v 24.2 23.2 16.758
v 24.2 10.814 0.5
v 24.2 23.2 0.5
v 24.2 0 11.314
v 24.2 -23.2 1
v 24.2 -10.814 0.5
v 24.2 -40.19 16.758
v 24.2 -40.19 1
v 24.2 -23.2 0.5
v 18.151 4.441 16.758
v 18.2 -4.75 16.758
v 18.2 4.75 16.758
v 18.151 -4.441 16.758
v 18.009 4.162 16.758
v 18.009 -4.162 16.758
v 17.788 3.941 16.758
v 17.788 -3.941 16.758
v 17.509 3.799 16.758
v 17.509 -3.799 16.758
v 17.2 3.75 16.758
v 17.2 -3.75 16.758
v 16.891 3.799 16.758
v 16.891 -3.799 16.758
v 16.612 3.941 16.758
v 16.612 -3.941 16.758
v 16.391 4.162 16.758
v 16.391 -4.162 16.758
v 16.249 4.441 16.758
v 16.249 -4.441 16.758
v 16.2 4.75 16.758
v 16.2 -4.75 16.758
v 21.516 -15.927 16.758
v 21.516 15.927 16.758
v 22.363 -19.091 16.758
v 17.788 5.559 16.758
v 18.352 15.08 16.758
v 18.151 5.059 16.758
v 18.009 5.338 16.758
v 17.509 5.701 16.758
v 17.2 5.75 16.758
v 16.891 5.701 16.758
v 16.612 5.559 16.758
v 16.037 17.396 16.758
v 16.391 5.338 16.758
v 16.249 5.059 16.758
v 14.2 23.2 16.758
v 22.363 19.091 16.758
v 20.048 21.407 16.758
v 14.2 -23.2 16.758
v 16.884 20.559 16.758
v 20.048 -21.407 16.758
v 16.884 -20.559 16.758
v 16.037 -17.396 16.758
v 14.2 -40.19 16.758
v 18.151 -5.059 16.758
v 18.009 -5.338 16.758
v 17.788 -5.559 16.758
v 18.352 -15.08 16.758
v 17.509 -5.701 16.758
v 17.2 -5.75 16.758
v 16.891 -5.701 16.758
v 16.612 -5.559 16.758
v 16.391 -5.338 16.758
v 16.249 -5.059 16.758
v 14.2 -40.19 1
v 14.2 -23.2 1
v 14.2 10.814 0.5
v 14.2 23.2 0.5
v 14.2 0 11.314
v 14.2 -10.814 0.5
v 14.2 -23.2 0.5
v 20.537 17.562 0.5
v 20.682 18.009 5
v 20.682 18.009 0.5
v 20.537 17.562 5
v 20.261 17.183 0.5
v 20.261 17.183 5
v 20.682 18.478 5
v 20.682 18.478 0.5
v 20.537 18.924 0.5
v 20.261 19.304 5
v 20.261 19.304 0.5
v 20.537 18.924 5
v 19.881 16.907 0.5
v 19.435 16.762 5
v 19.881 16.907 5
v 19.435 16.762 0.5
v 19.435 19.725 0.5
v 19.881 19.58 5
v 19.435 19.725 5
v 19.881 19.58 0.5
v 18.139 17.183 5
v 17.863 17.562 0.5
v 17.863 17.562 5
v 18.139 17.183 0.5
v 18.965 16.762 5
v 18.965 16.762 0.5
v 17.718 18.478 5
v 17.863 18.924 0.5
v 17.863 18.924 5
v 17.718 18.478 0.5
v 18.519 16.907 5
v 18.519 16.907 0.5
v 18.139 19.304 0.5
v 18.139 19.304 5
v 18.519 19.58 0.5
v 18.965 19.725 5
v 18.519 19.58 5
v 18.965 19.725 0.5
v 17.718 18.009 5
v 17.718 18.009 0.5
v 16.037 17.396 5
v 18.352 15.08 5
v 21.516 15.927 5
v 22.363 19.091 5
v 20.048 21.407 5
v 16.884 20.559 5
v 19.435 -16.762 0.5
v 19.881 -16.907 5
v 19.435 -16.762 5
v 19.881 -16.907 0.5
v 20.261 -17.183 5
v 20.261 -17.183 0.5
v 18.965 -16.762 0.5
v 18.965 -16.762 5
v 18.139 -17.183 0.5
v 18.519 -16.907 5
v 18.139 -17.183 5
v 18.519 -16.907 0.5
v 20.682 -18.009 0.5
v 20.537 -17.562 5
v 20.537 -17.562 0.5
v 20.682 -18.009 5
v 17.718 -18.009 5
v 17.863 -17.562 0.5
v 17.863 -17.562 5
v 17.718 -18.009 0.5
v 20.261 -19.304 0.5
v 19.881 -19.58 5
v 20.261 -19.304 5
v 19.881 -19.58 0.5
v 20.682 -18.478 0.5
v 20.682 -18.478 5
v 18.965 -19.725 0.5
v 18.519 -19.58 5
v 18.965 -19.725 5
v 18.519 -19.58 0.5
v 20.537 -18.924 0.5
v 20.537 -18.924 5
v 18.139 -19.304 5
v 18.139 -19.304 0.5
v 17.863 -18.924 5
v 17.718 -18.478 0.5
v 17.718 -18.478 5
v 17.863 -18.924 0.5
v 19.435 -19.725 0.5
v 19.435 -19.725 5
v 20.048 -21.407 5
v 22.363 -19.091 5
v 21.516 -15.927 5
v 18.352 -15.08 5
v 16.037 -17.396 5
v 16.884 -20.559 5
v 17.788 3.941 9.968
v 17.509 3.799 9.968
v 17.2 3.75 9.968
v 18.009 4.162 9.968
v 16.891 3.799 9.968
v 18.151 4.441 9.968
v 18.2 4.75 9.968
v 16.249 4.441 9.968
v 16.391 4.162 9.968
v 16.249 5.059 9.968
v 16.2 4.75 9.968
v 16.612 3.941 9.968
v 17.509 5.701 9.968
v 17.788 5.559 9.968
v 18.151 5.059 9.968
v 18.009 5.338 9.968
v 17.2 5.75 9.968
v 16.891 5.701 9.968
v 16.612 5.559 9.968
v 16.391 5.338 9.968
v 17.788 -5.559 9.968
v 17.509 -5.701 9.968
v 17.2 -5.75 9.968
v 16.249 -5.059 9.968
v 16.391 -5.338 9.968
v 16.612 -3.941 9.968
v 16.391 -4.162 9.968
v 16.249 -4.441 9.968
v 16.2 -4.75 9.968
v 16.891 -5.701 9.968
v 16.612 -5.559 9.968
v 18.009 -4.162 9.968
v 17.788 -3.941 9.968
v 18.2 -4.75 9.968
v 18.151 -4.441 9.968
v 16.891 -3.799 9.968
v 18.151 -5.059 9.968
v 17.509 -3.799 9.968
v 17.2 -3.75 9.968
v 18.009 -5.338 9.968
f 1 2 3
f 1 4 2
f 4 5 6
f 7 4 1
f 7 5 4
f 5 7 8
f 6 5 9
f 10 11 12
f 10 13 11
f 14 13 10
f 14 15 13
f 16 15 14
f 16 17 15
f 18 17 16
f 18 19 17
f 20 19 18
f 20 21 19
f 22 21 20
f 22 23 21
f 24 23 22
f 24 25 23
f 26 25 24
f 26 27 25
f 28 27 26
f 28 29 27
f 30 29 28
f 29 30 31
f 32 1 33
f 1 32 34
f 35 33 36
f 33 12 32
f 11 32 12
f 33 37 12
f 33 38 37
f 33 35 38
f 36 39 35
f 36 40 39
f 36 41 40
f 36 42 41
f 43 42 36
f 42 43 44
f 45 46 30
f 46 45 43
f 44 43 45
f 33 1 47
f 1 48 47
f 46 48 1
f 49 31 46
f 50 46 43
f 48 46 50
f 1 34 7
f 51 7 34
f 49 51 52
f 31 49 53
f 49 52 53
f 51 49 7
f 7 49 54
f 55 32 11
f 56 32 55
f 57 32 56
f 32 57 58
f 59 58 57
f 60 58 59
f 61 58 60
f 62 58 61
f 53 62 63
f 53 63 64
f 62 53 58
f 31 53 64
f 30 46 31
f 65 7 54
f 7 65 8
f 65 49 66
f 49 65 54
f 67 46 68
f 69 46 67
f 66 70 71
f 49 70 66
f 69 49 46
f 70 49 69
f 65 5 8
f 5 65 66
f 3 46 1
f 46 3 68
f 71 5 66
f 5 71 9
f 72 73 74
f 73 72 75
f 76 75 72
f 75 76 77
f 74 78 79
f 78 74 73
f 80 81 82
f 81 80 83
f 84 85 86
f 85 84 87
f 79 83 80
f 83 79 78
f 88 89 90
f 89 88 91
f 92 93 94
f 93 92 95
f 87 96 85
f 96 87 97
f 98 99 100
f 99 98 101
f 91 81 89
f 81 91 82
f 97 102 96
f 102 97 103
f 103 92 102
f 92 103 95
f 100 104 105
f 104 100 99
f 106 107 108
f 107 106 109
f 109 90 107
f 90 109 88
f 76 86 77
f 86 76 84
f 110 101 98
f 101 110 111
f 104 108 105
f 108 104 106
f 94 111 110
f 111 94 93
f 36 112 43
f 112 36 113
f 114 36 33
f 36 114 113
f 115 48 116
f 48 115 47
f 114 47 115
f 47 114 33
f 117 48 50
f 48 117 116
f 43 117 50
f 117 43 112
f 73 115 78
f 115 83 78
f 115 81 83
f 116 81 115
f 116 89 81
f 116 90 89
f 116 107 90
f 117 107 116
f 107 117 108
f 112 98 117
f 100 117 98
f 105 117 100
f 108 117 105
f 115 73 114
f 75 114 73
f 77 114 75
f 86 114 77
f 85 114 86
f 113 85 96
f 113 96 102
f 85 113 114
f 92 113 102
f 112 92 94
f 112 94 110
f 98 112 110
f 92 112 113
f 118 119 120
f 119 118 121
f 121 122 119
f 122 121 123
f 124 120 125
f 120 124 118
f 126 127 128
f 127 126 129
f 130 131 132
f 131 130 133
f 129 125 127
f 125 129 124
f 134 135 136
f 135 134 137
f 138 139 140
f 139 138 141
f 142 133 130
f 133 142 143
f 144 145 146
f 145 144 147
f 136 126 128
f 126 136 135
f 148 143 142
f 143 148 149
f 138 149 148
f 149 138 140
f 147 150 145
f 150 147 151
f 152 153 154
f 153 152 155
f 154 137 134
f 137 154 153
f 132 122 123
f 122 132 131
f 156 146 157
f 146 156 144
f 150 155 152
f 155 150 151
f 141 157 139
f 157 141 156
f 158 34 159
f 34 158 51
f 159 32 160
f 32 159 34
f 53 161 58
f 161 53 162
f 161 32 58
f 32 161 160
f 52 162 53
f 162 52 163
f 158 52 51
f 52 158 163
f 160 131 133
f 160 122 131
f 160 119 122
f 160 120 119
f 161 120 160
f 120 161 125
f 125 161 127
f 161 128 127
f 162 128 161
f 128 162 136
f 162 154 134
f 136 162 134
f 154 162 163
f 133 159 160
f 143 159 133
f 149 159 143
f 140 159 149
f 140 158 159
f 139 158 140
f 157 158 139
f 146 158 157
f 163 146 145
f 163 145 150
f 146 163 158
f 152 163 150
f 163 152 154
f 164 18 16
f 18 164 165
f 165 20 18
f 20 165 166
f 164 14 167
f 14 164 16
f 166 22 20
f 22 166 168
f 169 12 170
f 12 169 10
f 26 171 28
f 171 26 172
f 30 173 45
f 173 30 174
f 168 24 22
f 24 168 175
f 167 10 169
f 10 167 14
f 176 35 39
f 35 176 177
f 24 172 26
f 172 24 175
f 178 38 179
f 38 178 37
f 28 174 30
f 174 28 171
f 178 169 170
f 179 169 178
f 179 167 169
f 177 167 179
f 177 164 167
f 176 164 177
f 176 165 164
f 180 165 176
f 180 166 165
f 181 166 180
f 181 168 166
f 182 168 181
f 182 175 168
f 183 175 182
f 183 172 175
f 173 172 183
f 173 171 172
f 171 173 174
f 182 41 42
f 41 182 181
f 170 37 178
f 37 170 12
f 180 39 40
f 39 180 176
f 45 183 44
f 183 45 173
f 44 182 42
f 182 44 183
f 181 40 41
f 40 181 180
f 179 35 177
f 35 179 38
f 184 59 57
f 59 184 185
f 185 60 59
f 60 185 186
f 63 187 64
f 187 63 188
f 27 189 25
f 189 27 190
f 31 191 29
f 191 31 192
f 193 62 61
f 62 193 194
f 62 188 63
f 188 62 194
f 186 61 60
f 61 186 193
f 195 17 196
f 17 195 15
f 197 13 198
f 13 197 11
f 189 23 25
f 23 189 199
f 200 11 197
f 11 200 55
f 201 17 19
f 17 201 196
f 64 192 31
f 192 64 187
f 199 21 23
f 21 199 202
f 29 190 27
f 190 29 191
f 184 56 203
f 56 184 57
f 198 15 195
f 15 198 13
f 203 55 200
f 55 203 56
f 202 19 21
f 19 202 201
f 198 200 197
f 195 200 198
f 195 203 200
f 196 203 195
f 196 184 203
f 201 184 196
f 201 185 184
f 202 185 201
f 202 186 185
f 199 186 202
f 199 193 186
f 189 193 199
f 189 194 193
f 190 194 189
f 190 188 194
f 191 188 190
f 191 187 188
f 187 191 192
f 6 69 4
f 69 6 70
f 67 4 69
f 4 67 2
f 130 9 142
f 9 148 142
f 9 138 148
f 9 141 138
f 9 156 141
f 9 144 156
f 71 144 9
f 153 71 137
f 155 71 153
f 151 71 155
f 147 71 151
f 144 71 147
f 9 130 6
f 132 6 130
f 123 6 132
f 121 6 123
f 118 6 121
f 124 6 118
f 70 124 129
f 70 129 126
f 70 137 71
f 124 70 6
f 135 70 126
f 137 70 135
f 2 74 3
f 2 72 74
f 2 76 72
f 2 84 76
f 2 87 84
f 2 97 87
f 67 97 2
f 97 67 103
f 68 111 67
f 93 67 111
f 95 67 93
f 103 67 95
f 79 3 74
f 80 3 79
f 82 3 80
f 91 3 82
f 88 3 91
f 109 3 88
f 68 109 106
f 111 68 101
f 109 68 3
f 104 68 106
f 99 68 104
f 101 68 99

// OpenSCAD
// file: ../../../parts/switch.scad
/*
    SWITCH
*/

switch_x = 19.8;
switch_y = 11.5;
switch_y_total = 15.3;
switch_z = 6.4;
switch_diameter = 2; // 2.5

module switch() {
	
	//difference() {
		
		union() {
				
			translate([0, (switch_y / 2) - 2.9, 0])
			cube([switch_x, switch_y, switch_z], center = true);
			
			switch_pin_y = switch_y_total - switch_y;
			color([0, 1, 0, 0.7])
			translate([0, -(switch_pin_y / 2) - 2.9 + 0.01, 0])
			cube([switch_x, switch_pin_y, switch_z], center = true);
		}
		
		color([1, 0, 0, 0.7])
		union() {
			translate([-9.5 / 2, 0, 0])
			cylinder (r=(switch_diameter / 2), h=20 , center=true);
			translate([ 9.5 / 2, 0, 0])
			cylinder (r=(switch_diameter / 2), h=20 , center=true);
		}
	//}
}
// ss-5gl
// file: ../../config.scad
include <../parts/switch.scad>


rod_side = 16;
rod_length = 700;

rod_horizontal_spacing	= 120; // center to center / min 105
rod_vertical_spacing	= 2;

bearing_outer_diameter = 10;
bearing_inner_diameter = 3;
bearing_height = 4;

    // avoid touching this except if you know what's you're doing
    
bearing_holder_spacing_1 = 0.7; // space between bearing flat sides and piece
bearing_holder_spacing_2 = 1; // space between bearing perimeter and piece
bearing_holder_width = 3; // thickness of pieces holding the bearings
bearing_screw_access_size = 10; // the size of the cube to remove to be able to put in place the bearing screw

screw_exceed = 3; // how much you want a screew can exceed in length
    // default M3 screws size
screw_diameter = 3; // the diameter of your screws
    // default M3 nuts size
screws_nuts_side_min = 5.75; // 5.4min
screws_nuts_side_max = 6.55; // default is 6mm but we add some margin
screw_nuts_height = 3; // default is 2.4mm
screws_material_holder_min_size = 3; // the minimum of material arround a screw
screws_attach_length = 10; // the min length of the screew which will attach the 2 pieces

rod_holder_size = 10; // the length of material which will tighten the cariage rods

rod_piece_spacing = 1; // space between rod and piece
   
pieces_spacing = 1; // the space between the 2 pieces

motor_holder_thickness = 4; // thickness of motor support


/*
    Computed variables for future use
*/

rod_remove_side = rod_side + (rod_piece_spacing * 2);

    // represent the min size of material which should warp a screw
screw_virtual_holder_side = screw_diameter + (screws_material_holder_min_size * 2);

	// represent the area taken by bearings
bearing_virtual_cube_side = (((rod_side / 2) + bearing_outer_diameter + (bearing_height / 2) + bearing_holder_spacing_1 + bearing_holder_width) / sqrt(2)) * 2;

    // the outers screews could touch the rod, so we need to compute an offset
space_rod_outer = (bearing_virtual_cube_side - (rod_remove_side * sqrt(2))) / 2; // the minimum must be screw_virtual_holder_side
echo("space_rod_outer", space_rod_outer);
outer_screw_offset = abs(screw_virtual_holder_side - space_rod_outer);

	// base piece size
base_block_x = rod_horizontal_spacing + (rod_side * sqrt(2)) + (screw_virtual_holder_side * 2);  
base_block_y = bearing_virtual_cube_side + rod_holder_size /*+ screw_virtual_holder_side*/ + outer_screw_offset;
base_block_z = max(bearing_virtual_cube_side, rod_remove_side * sqrt(2) + motor_holder_thickness * 2);


 base_block_remove_x = rod_horizontal_spacing - (rod_side * sqrt(2)) - (screw_virtual_holder_side * 2);
base_block_remove_y = base_block_y;
base_block_remove_z = max(rod_remove_side * sqrt(2), base_block_z - (motor_holder_thickness * 2));



/*
    RODS
*/

module rod(show_rods) {
    if(show_rods) {
        color([0.7, 0.7, 0.7])
        rotate([45, 0, 0])
        cube([rod_length, rod_side, rod_side], center = true);
    }
}
// draw a rod


module screw() {
    screw_height = 50;
    cylinder (r=(screw_diameter / 2), h=screw_height , center=true);
}




module base_screw_remove_tighten() {
    
    
    color([1, 0, 0, 0.7])
    union() {
        
        screw_length = base_block_z + 1;
        
        cylinder (r=(screw_diameter / 2), h=screw_length, center=true);
    
        nuts_remove_length = (screw_length / 2) - (screws_attach_length / 2);
    
        translate([0, 0, (screw_length / 2) - (nuts_remove_length / 2)])
        cylinder ($fn = 6, r=(screws_nuts_side_max / 2), h=nuts_remove_length, center=true);
        
        translate([0, 0, -((screw_length / 2) - (nuts_remove_length / 2))])
        cylinder ($fn = 6, r=(screws_nuts_side_max / 2), h=nuts_remove_length, center=true);
    }
}
// base_screw_remove_tighten



/*
    SWITCH
*/

switch_x = 19.8;
switch_y = 11.5;
switch_y_total = 15.3;
switch_z = 6.4;
switch_diameter = 2; // 2.5

module switch() {
	
	//difference() {
		
		union() {
				
			translate([0, (switch_y / 2) - 2.9, 0])
			cube([switch_x, switch_y, switch_z], center = true);
			
			switch_pin_y = switch_y_total - switch_y;
			color([0, 1, 0, 0.7])
			translate([0, -(switch_pin_y / 2) - 2.9 + 0.01, 0])
			cube([switch_x, switch_pin_y, switch_z], center = true);
		}
		
		color([1, 0, 0, 0.7])
		union() {
			translate([-9.5 / 2, 0, 0])
			cylinder (r=(switch_diameter / 2), h=20 , center=true);
			translate([ 9.5 / 2, 0, 0])
			cylinder (r=(switch_diameter / 2), h=20 , center=true);
		}
	//}
}
// ss-5gl
// main file
$fn=20;

include <../../config.scad>

frame_rod_side = 20.4;
material_thickness_frame_rod = 4;


base_x = frame_rod_side + material_thickness_frame_rod + rod_holder_size;
base_y = frame_rod_side + (material_thickness_frame_rod * 2) + (screw_virtual_holder_side * 2);
base_z = base_block_z;

base_x_offset = (base_x / 2) - (frame_rod_side / 2);

base_belt_holder_block_y = 17;
base_belt_holder_block_offset_y = (base_y / 2) + (base_belt_holder_block_y / 2);

base_belt_holder_block_remove_x = frame_rod_side;
base_belt_holder_block_remove_z = 50;
base_belt_holder_block_remove_offset_x = material_thickness_frame_rod;


module frame_rod() {
	color([0.7, 0.7, 0.7])
	cube([frame_rod_side + 0.01, frame_rod_side, 500], center = true);
}
// frame_rod

module positioned_rod() {
	translate([(rod_length / 2) + (frame_rod_side / 2) + material_thickness_frame_rod, 0, 0])
	rod(true);
}
// positioned_rod

module screw_and_head(screw_height) {
	screw_head_diameter = 8;
	
	color([1, 0, 0, 0.7])
	union() {
		translate([0, 0, -(screw_height / 2)])
		cylinder (r=(screw_diameter / 2), h=screw_height , center=true);
		translate([0, 0, (screw_height / 2) - 0.01])
		cylinder (r=(screw_head_diameter / 2), h=screw_height , center=true);
	}
}
// screw_and_head


module screw_holes() {
	screw_hole_offset = frame_rod_side / 2 + material_thickness_frame_rod;
	
	translate([0, -screw_hole_offset, 0])
	rotate([90, 0, 0])
	screw_and_head(20);
	
	translate([0, screw_hole_offset, 0])
	rotate([-90, 0, 0])
	screw_and_head(20);
	
	translate([screw_hole_offset + 0.1, 0, 0])
	rotate([0, 90, 0])
	screw_and_head(20);
}
// screw_holes


module base_screw_remove_tighten() {
    
    
    color([1, 0, 0, 0.7])
    union() {
        
        screw_length = base_block_z + 1;
        
        cylinder (r=(screw_diameter / 2), h=screw_length, center=true);
    
        nuts_remove_length = (screw_length / 2) - (screws_attach_length / 2);
    
        translate([0, 0, (screw_length / 2) - (nuts_remove_length / 2)])
        cylinder ($fn = 6, r=(screws_nuts_side_max / 2), h=nuts_remove_length, center=true);
        
        translate([0, 0, -((screw_length / 2) - (nuts_remove_length / 2))])
        cylinder ($fn = 6, r=(screws_nuts_side_max / 2), h=nuts_remove_length, center=true);
    }
}
// base_screw_remove_tighten

module positioned_base_screw_remove_tighten() {
    base_screw_remove_tighten_x = (frame_rod_side / 2) + material_thickness_frame_rod + (rod_holder_size / 2);
    base_screw_remove_tighten_y = (base_block_y / 2) - (screw_virtual_holder_side / 2) - 1.5;
    

    translate([base_screw_remove_tighten_x, 0, 0])
    union() {
        translate([0, base_screw_remove_tighten_y, 0])
        rotate([0, 0, -45 ])
        base_screw_remove_tighten();
		
		translate([0, -base_screw_remove_tighten_y, 0])
        rotate([0, 0, +45 ])
        base_screw_remove_tighten();
    }
}
// positioned_base_screw_remove_tighten



module positioned_switch() {
	switch_offset_x = (frame_rod_side / 2) + material_thickness_frame_rod + 3;
	switch_offset_z = (base_z / 2) + (switch_z / 2);
	
	translate([switch_offset_x, 0, switch_offset_z + 0.01])
	rotate([0, 0, -90])
	switch();
}
// positioned_switch



module base_block_separator() {
	base_block_separator_offset_x = frame_rod_side / 2 + material_thickness_frame_rod + rod_holder_size;
	translate([base_block_separator_offset_x, 0, 0])
	cube([rod_holder_size * 2, 100, 1], center = true);
}
// base_block_separator

module base_block_spliter() {
	base_block_spliter_z = 50;
	
	base_block_separator_offset_x = frame_rod_side / 2 + material_thickness_frame_rod + rod_holder_size;
	color([0, 0, 1, .7])
	translate([base_block_separator_offset_x, 0, base_block_spliter_z / 2])
	cube([rod_holder_size * 2, 100, base_block_spliter_z], center = true);
}
// base_block_spliter


/*
    BELT HOLDER
*/

module base_belt_holder_block_belt_remove() {
	base_belt_holder_block_belt_remove_x = rod_holder_size * 2;
	base_belt_holder_block_belt_remove_y = base_belt_holder_block_y * 2;
	
	base_belt_holder_block_belt_remove_offset_x = (frame_rod_side /2) + material_thickness_frame_rod + (rod_holder_size / 2);
	
	translate([base_belt_holder_block_belt_remove_offset_x, -(base_belt_holder_block_y / 2) + 0.01, 0])
	cube([base_belt_holder_block_belt_remove_x, base_belt_holder_block_belt_remove_y, 2], center = true);
}
// base_belt_holder_block_belt_remove

module base_belt_holder_block_screw_remove() {
	screw_m2_diameter = 2;
	screw_m2_offset_x = -(frame_rod_side / 2) + (material_thickness_frame_rod / 2);
	
	translate([screw_m2_offset_x, 0, -4.5])
	rotate([0, 90, 0])
	cylinder (r=(screw_m2_diameter / 2), h=20 , center=true);
}
// base_belt_holder_block_screw_remove

module base_belt_holder_block_remove() {
	
	translate([base_belt_holder_block_remove_offset_x, 0, 0])
	cube([base_belt_holder_block_remove_x, base_belt_holder_block_y + 0.01, base_belt_holder_block_remove_z], center = true);
}
// base_belt_holder_block_remove

module base_belt_holder_block() {
	color([1, 0.5, 0, 0.7])
	translate([base_x_offset, 0, 0])
	cube([base_x, base_belt_holder_block_y, base_z], center = true);
}
// base_belt_holder_block


module base_belt_holder_block_full() {
	translate([0, -base_belt_holder_block_offset_y + 0.01, 0])
	difference() {
		union() {
			base_belt_holder_block();
		}
		
		base_belt_holder_block_remove();
		base_belt_holder_block_belt_remove();
		base_belt_holder_block_screw_remove();
		
	}
}
// base_belt_holder_block_full


module base_block() {
	color([1, 1, 0, 0.7])
	translate([base_x_offset, 0, 0])
	cube([base_x, base_y, base_z], center = true);
}
// base_block





module base_block_full() {
	difference() {
		union() {	
			base_block();
			base_belt_holder_block_full();
		}
		
		union() {
			frame_rod();
			positioned_rod();
			screw_holes();
			base_block_separator();
			positioned_base_screw_remove_tighten();
			positioned_switch();
		}
	}
}
// base_block_full

module _render() {
	intersection() { // difference, intersection
		base_block_full();
		base_block_spliter();
	}

}
// _render

_render();
